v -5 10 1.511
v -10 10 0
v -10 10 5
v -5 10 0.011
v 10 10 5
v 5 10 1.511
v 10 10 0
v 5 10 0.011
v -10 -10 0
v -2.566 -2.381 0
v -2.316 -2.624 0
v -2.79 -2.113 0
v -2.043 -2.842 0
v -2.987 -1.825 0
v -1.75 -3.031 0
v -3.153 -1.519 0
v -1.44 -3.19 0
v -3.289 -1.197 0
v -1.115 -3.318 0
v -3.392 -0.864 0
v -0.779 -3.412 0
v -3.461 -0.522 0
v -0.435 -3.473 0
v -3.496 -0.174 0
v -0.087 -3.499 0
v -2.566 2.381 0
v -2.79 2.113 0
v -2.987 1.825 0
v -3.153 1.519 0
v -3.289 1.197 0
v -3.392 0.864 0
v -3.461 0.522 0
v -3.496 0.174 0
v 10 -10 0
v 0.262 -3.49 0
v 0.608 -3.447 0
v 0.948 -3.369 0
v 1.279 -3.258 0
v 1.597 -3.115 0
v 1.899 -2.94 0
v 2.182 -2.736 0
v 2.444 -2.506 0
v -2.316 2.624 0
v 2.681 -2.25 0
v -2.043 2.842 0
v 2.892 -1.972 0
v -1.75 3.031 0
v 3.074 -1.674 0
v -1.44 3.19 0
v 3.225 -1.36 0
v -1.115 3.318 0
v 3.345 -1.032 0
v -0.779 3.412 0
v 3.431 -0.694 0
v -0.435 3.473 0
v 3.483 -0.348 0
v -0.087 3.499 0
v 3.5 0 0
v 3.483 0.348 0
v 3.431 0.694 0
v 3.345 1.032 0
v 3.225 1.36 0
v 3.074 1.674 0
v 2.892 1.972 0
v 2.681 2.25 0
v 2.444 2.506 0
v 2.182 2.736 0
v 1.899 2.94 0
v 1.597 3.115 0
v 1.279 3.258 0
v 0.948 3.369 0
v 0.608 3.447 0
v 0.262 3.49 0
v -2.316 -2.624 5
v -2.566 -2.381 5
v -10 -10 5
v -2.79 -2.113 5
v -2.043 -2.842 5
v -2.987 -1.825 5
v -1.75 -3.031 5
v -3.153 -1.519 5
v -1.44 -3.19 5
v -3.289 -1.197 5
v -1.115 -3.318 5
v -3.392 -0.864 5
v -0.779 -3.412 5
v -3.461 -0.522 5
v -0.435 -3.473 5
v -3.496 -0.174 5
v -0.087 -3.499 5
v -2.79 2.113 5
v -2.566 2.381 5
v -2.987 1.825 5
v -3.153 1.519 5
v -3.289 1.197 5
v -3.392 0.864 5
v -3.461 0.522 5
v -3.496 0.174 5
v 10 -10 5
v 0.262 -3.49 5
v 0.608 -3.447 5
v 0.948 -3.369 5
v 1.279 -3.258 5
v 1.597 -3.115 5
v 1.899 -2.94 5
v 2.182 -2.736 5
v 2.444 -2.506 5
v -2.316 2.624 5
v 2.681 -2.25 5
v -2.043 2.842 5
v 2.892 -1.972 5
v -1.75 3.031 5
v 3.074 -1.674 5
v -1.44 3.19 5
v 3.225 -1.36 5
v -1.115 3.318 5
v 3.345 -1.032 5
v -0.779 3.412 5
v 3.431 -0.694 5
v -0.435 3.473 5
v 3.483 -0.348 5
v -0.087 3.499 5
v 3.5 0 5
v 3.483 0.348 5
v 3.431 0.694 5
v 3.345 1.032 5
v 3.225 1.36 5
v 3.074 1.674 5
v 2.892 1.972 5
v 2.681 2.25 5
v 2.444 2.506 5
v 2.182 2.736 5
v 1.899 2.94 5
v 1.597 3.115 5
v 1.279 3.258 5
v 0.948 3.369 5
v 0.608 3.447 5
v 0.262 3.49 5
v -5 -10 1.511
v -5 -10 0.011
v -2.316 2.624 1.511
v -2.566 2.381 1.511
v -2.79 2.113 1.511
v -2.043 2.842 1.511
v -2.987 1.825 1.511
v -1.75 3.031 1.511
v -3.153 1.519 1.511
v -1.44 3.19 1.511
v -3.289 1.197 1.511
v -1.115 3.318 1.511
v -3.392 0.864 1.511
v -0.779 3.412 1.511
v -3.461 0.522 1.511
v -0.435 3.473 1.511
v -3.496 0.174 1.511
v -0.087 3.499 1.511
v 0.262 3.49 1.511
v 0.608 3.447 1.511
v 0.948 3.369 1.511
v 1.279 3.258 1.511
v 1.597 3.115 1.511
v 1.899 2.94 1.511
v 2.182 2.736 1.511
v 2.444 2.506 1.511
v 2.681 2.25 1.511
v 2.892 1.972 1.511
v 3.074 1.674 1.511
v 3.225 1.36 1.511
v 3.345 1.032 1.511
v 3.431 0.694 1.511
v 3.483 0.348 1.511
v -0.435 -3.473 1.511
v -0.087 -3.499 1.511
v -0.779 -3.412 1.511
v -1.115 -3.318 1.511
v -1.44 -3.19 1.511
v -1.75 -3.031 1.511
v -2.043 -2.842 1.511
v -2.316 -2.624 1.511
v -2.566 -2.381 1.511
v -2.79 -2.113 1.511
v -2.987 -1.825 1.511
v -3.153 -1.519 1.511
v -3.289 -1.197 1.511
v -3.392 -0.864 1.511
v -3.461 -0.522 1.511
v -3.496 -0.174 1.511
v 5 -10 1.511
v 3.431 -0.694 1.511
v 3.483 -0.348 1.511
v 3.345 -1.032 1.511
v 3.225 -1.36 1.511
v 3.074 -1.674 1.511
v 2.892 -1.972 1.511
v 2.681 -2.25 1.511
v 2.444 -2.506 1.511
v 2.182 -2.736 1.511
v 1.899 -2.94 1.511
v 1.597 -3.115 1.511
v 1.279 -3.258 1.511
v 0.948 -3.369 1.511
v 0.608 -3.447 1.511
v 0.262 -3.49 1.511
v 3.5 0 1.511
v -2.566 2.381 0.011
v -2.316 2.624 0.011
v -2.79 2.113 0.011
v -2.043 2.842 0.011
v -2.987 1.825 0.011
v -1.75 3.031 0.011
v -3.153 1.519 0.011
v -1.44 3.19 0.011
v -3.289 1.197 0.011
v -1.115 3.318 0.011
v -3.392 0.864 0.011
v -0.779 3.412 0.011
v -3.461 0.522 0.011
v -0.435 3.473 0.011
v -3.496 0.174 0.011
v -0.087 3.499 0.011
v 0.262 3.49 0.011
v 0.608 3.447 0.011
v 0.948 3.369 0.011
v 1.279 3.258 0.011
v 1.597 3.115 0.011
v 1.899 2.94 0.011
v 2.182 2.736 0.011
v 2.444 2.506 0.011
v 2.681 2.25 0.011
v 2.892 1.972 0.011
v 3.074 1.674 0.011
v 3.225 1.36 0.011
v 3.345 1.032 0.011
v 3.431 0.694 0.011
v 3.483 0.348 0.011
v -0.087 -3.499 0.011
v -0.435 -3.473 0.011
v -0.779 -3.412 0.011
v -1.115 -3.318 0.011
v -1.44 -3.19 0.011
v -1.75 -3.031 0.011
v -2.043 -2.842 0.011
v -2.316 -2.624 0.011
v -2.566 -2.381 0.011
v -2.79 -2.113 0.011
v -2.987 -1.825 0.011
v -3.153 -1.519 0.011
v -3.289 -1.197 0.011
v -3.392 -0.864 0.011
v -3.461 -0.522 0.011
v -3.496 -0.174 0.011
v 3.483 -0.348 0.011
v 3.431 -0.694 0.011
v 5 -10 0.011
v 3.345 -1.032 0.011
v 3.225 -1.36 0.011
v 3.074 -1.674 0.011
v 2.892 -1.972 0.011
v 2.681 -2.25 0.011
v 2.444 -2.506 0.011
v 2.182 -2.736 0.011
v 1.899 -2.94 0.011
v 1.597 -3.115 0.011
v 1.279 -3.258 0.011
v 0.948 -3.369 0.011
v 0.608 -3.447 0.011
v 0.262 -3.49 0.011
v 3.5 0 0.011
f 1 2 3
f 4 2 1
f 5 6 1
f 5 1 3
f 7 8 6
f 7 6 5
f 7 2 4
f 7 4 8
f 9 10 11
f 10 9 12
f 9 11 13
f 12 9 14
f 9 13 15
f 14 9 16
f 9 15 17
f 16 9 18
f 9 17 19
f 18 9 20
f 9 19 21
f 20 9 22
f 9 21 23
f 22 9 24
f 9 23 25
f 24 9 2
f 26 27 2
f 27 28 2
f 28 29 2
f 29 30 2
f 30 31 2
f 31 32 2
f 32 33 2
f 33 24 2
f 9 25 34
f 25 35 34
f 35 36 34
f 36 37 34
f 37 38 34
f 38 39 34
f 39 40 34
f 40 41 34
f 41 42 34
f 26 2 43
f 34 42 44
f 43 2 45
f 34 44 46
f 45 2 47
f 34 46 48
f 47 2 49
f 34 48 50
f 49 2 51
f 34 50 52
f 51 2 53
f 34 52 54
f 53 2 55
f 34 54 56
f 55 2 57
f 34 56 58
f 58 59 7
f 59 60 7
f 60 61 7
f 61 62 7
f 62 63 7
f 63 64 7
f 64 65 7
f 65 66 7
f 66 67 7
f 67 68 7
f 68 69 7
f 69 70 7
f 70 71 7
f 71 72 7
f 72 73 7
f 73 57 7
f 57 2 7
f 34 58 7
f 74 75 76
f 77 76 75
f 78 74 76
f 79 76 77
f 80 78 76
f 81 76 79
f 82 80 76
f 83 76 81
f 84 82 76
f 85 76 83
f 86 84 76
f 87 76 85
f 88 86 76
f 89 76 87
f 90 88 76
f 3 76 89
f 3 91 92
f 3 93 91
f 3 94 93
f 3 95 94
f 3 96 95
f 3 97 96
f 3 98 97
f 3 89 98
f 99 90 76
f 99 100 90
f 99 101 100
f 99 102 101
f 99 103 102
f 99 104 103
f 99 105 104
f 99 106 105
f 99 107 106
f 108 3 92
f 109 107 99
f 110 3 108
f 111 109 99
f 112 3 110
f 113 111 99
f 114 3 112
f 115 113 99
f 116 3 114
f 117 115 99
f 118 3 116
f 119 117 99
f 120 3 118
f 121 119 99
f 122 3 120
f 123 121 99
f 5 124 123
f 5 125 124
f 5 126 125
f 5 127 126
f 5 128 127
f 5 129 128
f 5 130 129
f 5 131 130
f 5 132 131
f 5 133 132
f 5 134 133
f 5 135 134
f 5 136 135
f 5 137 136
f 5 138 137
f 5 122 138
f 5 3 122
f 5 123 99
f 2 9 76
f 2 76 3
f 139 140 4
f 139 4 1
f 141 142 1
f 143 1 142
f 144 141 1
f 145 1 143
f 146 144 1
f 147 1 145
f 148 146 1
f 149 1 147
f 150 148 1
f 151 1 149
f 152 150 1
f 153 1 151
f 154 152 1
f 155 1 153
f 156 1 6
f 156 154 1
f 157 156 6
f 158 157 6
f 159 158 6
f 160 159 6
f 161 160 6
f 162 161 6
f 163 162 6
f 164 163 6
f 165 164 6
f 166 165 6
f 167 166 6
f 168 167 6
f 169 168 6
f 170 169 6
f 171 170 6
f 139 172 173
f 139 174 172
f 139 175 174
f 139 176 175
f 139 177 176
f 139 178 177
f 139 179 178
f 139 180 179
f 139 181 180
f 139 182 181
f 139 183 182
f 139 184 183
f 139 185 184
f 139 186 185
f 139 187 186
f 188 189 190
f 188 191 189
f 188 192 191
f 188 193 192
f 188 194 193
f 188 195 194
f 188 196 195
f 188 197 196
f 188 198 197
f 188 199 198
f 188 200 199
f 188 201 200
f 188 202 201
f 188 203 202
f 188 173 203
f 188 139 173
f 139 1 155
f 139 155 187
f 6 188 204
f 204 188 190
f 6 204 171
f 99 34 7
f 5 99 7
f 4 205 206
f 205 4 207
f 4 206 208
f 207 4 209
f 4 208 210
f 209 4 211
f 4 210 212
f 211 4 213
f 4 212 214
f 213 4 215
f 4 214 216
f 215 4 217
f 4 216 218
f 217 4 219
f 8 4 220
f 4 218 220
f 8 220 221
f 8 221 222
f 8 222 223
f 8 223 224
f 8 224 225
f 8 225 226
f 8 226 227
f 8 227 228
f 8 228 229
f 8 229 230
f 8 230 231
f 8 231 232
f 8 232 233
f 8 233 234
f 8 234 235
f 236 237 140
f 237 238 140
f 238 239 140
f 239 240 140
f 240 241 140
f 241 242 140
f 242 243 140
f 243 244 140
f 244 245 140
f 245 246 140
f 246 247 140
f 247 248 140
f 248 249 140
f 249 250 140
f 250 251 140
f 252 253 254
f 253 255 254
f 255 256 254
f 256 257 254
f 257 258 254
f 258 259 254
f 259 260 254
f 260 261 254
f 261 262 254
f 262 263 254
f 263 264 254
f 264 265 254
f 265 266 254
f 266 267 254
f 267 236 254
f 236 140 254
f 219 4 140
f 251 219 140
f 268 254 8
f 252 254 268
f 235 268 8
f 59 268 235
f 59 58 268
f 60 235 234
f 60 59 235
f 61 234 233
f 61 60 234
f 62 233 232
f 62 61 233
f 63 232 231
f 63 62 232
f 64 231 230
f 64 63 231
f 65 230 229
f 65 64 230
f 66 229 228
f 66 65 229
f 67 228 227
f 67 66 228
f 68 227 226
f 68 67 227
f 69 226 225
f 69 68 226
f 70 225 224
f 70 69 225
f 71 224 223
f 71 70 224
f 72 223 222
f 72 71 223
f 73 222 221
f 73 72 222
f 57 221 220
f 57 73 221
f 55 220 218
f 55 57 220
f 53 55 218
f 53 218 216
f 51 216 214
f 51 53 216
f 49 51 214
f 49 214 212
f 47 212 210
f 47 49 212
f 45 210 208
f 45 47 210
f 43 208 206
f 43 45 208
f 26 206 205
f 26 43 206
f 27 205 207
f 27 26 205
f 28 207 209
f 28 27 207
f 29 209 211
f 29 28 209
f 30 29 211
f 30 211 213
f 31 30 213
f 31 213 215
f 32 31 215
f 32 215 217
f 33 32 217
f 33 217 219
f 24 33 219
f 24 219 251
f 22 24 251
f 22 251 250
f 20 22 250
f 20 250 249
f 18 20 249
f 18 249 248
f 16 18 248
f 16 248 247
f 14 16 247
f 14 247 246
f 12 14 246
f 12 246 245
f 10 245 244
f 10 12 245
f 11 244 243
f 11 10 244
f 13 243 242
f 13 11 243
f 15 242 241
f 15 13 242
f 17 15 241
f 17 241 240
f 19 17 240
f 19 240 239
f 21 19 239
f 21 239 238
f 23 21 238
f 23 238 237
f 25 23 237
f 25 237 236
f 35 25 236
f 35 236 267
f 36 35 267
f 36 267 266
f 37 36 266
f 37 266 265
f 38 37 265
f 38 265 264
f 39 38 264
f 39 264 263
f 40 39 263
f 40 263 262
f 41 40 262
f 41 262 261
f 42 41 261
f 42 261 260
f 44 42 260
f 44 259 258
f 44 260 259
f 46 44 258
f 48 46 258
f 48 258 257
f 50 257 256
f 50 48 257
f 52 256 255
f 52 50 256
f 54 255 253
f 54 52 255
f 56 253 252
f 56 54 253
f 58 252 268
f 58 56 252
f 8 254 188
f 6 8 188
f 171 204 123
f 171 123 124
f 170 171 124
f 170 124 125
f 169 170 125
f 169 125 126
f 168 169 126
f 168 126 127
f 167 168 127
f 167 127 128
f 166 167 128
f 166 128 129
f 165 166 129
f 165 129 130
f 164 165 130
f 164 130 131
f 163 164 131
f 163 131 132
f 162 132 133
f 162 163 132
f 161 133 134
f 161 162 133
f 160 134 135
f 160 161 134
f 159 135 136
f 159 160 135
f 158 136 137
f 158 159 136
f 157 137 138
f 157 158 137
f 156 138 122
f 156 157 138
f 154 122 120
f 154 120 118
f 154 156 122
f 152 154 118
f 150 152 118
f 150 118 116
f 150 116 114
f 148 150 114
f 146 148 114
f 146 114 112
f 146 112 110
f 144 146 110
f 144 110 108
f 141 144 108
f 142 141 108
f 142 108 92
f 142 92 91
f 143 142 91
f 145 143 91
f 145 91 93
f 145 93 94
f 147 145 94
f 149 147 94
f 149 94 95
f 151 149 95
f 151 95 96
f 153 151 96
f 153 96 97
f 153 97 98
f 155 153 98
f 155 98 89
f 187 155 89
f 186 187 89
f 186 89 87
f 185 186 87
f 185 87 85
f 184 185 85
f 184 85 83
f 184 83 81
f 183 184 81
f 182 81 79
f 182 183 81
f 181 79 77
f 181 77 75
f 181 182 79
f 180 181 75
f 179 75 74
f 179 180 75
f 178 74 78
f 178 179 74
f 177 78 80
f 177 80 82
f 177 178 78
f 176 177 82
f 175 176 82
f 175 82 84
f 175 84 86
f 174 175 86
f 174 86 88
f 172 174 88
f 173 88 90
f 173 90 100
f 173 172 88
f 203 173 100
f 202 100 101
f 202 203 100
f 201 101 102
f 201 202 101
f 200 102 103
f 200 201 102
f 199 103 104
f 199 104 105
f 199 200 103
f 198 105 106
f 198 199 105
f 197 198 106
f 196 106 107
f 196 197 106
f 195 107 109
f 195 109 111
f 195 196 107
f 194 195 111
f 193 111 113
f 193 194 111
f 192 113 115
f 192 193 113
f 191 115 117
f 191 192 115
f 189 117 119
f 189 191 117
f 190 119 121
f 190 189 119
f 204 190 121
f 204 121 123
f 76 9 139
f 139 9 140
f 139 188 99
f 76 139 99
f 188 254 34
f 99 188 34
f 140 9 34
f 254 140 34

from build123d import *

# Parameters (mm, degrees)
F0_W     = 20
F0_H     = 20
F0_R     = 3.5
F1_DEPTH = 5
F2_W     = 10
F2_H     = 1.5
F3_DEPTH = 12.5


# Not quite as in the source:
# - a feature names something its author has since deleted; it is built from what else it names


with BuildPart() as f1:
    # F0 (on Top) → F1 (new body)
    with BuildSketch(Plane.XY):
        Rectangle(F0_W, F0_H)
        Circle(F0_R, mode=Mode.SUBTRACT)
    extrude(amount=F1_DEPTH)

    # F2 (on Front) → F3 (cut, symmetric)
    with BuildSketch(Plane.XZ):
        with Locations((0, 0.7610858302)):
            Rectangle(F2_W, F2_H)
    extrude(amount=F3_DEPTH, both=True, mode=Mode.SUBTRACT)


solid = f1.part
